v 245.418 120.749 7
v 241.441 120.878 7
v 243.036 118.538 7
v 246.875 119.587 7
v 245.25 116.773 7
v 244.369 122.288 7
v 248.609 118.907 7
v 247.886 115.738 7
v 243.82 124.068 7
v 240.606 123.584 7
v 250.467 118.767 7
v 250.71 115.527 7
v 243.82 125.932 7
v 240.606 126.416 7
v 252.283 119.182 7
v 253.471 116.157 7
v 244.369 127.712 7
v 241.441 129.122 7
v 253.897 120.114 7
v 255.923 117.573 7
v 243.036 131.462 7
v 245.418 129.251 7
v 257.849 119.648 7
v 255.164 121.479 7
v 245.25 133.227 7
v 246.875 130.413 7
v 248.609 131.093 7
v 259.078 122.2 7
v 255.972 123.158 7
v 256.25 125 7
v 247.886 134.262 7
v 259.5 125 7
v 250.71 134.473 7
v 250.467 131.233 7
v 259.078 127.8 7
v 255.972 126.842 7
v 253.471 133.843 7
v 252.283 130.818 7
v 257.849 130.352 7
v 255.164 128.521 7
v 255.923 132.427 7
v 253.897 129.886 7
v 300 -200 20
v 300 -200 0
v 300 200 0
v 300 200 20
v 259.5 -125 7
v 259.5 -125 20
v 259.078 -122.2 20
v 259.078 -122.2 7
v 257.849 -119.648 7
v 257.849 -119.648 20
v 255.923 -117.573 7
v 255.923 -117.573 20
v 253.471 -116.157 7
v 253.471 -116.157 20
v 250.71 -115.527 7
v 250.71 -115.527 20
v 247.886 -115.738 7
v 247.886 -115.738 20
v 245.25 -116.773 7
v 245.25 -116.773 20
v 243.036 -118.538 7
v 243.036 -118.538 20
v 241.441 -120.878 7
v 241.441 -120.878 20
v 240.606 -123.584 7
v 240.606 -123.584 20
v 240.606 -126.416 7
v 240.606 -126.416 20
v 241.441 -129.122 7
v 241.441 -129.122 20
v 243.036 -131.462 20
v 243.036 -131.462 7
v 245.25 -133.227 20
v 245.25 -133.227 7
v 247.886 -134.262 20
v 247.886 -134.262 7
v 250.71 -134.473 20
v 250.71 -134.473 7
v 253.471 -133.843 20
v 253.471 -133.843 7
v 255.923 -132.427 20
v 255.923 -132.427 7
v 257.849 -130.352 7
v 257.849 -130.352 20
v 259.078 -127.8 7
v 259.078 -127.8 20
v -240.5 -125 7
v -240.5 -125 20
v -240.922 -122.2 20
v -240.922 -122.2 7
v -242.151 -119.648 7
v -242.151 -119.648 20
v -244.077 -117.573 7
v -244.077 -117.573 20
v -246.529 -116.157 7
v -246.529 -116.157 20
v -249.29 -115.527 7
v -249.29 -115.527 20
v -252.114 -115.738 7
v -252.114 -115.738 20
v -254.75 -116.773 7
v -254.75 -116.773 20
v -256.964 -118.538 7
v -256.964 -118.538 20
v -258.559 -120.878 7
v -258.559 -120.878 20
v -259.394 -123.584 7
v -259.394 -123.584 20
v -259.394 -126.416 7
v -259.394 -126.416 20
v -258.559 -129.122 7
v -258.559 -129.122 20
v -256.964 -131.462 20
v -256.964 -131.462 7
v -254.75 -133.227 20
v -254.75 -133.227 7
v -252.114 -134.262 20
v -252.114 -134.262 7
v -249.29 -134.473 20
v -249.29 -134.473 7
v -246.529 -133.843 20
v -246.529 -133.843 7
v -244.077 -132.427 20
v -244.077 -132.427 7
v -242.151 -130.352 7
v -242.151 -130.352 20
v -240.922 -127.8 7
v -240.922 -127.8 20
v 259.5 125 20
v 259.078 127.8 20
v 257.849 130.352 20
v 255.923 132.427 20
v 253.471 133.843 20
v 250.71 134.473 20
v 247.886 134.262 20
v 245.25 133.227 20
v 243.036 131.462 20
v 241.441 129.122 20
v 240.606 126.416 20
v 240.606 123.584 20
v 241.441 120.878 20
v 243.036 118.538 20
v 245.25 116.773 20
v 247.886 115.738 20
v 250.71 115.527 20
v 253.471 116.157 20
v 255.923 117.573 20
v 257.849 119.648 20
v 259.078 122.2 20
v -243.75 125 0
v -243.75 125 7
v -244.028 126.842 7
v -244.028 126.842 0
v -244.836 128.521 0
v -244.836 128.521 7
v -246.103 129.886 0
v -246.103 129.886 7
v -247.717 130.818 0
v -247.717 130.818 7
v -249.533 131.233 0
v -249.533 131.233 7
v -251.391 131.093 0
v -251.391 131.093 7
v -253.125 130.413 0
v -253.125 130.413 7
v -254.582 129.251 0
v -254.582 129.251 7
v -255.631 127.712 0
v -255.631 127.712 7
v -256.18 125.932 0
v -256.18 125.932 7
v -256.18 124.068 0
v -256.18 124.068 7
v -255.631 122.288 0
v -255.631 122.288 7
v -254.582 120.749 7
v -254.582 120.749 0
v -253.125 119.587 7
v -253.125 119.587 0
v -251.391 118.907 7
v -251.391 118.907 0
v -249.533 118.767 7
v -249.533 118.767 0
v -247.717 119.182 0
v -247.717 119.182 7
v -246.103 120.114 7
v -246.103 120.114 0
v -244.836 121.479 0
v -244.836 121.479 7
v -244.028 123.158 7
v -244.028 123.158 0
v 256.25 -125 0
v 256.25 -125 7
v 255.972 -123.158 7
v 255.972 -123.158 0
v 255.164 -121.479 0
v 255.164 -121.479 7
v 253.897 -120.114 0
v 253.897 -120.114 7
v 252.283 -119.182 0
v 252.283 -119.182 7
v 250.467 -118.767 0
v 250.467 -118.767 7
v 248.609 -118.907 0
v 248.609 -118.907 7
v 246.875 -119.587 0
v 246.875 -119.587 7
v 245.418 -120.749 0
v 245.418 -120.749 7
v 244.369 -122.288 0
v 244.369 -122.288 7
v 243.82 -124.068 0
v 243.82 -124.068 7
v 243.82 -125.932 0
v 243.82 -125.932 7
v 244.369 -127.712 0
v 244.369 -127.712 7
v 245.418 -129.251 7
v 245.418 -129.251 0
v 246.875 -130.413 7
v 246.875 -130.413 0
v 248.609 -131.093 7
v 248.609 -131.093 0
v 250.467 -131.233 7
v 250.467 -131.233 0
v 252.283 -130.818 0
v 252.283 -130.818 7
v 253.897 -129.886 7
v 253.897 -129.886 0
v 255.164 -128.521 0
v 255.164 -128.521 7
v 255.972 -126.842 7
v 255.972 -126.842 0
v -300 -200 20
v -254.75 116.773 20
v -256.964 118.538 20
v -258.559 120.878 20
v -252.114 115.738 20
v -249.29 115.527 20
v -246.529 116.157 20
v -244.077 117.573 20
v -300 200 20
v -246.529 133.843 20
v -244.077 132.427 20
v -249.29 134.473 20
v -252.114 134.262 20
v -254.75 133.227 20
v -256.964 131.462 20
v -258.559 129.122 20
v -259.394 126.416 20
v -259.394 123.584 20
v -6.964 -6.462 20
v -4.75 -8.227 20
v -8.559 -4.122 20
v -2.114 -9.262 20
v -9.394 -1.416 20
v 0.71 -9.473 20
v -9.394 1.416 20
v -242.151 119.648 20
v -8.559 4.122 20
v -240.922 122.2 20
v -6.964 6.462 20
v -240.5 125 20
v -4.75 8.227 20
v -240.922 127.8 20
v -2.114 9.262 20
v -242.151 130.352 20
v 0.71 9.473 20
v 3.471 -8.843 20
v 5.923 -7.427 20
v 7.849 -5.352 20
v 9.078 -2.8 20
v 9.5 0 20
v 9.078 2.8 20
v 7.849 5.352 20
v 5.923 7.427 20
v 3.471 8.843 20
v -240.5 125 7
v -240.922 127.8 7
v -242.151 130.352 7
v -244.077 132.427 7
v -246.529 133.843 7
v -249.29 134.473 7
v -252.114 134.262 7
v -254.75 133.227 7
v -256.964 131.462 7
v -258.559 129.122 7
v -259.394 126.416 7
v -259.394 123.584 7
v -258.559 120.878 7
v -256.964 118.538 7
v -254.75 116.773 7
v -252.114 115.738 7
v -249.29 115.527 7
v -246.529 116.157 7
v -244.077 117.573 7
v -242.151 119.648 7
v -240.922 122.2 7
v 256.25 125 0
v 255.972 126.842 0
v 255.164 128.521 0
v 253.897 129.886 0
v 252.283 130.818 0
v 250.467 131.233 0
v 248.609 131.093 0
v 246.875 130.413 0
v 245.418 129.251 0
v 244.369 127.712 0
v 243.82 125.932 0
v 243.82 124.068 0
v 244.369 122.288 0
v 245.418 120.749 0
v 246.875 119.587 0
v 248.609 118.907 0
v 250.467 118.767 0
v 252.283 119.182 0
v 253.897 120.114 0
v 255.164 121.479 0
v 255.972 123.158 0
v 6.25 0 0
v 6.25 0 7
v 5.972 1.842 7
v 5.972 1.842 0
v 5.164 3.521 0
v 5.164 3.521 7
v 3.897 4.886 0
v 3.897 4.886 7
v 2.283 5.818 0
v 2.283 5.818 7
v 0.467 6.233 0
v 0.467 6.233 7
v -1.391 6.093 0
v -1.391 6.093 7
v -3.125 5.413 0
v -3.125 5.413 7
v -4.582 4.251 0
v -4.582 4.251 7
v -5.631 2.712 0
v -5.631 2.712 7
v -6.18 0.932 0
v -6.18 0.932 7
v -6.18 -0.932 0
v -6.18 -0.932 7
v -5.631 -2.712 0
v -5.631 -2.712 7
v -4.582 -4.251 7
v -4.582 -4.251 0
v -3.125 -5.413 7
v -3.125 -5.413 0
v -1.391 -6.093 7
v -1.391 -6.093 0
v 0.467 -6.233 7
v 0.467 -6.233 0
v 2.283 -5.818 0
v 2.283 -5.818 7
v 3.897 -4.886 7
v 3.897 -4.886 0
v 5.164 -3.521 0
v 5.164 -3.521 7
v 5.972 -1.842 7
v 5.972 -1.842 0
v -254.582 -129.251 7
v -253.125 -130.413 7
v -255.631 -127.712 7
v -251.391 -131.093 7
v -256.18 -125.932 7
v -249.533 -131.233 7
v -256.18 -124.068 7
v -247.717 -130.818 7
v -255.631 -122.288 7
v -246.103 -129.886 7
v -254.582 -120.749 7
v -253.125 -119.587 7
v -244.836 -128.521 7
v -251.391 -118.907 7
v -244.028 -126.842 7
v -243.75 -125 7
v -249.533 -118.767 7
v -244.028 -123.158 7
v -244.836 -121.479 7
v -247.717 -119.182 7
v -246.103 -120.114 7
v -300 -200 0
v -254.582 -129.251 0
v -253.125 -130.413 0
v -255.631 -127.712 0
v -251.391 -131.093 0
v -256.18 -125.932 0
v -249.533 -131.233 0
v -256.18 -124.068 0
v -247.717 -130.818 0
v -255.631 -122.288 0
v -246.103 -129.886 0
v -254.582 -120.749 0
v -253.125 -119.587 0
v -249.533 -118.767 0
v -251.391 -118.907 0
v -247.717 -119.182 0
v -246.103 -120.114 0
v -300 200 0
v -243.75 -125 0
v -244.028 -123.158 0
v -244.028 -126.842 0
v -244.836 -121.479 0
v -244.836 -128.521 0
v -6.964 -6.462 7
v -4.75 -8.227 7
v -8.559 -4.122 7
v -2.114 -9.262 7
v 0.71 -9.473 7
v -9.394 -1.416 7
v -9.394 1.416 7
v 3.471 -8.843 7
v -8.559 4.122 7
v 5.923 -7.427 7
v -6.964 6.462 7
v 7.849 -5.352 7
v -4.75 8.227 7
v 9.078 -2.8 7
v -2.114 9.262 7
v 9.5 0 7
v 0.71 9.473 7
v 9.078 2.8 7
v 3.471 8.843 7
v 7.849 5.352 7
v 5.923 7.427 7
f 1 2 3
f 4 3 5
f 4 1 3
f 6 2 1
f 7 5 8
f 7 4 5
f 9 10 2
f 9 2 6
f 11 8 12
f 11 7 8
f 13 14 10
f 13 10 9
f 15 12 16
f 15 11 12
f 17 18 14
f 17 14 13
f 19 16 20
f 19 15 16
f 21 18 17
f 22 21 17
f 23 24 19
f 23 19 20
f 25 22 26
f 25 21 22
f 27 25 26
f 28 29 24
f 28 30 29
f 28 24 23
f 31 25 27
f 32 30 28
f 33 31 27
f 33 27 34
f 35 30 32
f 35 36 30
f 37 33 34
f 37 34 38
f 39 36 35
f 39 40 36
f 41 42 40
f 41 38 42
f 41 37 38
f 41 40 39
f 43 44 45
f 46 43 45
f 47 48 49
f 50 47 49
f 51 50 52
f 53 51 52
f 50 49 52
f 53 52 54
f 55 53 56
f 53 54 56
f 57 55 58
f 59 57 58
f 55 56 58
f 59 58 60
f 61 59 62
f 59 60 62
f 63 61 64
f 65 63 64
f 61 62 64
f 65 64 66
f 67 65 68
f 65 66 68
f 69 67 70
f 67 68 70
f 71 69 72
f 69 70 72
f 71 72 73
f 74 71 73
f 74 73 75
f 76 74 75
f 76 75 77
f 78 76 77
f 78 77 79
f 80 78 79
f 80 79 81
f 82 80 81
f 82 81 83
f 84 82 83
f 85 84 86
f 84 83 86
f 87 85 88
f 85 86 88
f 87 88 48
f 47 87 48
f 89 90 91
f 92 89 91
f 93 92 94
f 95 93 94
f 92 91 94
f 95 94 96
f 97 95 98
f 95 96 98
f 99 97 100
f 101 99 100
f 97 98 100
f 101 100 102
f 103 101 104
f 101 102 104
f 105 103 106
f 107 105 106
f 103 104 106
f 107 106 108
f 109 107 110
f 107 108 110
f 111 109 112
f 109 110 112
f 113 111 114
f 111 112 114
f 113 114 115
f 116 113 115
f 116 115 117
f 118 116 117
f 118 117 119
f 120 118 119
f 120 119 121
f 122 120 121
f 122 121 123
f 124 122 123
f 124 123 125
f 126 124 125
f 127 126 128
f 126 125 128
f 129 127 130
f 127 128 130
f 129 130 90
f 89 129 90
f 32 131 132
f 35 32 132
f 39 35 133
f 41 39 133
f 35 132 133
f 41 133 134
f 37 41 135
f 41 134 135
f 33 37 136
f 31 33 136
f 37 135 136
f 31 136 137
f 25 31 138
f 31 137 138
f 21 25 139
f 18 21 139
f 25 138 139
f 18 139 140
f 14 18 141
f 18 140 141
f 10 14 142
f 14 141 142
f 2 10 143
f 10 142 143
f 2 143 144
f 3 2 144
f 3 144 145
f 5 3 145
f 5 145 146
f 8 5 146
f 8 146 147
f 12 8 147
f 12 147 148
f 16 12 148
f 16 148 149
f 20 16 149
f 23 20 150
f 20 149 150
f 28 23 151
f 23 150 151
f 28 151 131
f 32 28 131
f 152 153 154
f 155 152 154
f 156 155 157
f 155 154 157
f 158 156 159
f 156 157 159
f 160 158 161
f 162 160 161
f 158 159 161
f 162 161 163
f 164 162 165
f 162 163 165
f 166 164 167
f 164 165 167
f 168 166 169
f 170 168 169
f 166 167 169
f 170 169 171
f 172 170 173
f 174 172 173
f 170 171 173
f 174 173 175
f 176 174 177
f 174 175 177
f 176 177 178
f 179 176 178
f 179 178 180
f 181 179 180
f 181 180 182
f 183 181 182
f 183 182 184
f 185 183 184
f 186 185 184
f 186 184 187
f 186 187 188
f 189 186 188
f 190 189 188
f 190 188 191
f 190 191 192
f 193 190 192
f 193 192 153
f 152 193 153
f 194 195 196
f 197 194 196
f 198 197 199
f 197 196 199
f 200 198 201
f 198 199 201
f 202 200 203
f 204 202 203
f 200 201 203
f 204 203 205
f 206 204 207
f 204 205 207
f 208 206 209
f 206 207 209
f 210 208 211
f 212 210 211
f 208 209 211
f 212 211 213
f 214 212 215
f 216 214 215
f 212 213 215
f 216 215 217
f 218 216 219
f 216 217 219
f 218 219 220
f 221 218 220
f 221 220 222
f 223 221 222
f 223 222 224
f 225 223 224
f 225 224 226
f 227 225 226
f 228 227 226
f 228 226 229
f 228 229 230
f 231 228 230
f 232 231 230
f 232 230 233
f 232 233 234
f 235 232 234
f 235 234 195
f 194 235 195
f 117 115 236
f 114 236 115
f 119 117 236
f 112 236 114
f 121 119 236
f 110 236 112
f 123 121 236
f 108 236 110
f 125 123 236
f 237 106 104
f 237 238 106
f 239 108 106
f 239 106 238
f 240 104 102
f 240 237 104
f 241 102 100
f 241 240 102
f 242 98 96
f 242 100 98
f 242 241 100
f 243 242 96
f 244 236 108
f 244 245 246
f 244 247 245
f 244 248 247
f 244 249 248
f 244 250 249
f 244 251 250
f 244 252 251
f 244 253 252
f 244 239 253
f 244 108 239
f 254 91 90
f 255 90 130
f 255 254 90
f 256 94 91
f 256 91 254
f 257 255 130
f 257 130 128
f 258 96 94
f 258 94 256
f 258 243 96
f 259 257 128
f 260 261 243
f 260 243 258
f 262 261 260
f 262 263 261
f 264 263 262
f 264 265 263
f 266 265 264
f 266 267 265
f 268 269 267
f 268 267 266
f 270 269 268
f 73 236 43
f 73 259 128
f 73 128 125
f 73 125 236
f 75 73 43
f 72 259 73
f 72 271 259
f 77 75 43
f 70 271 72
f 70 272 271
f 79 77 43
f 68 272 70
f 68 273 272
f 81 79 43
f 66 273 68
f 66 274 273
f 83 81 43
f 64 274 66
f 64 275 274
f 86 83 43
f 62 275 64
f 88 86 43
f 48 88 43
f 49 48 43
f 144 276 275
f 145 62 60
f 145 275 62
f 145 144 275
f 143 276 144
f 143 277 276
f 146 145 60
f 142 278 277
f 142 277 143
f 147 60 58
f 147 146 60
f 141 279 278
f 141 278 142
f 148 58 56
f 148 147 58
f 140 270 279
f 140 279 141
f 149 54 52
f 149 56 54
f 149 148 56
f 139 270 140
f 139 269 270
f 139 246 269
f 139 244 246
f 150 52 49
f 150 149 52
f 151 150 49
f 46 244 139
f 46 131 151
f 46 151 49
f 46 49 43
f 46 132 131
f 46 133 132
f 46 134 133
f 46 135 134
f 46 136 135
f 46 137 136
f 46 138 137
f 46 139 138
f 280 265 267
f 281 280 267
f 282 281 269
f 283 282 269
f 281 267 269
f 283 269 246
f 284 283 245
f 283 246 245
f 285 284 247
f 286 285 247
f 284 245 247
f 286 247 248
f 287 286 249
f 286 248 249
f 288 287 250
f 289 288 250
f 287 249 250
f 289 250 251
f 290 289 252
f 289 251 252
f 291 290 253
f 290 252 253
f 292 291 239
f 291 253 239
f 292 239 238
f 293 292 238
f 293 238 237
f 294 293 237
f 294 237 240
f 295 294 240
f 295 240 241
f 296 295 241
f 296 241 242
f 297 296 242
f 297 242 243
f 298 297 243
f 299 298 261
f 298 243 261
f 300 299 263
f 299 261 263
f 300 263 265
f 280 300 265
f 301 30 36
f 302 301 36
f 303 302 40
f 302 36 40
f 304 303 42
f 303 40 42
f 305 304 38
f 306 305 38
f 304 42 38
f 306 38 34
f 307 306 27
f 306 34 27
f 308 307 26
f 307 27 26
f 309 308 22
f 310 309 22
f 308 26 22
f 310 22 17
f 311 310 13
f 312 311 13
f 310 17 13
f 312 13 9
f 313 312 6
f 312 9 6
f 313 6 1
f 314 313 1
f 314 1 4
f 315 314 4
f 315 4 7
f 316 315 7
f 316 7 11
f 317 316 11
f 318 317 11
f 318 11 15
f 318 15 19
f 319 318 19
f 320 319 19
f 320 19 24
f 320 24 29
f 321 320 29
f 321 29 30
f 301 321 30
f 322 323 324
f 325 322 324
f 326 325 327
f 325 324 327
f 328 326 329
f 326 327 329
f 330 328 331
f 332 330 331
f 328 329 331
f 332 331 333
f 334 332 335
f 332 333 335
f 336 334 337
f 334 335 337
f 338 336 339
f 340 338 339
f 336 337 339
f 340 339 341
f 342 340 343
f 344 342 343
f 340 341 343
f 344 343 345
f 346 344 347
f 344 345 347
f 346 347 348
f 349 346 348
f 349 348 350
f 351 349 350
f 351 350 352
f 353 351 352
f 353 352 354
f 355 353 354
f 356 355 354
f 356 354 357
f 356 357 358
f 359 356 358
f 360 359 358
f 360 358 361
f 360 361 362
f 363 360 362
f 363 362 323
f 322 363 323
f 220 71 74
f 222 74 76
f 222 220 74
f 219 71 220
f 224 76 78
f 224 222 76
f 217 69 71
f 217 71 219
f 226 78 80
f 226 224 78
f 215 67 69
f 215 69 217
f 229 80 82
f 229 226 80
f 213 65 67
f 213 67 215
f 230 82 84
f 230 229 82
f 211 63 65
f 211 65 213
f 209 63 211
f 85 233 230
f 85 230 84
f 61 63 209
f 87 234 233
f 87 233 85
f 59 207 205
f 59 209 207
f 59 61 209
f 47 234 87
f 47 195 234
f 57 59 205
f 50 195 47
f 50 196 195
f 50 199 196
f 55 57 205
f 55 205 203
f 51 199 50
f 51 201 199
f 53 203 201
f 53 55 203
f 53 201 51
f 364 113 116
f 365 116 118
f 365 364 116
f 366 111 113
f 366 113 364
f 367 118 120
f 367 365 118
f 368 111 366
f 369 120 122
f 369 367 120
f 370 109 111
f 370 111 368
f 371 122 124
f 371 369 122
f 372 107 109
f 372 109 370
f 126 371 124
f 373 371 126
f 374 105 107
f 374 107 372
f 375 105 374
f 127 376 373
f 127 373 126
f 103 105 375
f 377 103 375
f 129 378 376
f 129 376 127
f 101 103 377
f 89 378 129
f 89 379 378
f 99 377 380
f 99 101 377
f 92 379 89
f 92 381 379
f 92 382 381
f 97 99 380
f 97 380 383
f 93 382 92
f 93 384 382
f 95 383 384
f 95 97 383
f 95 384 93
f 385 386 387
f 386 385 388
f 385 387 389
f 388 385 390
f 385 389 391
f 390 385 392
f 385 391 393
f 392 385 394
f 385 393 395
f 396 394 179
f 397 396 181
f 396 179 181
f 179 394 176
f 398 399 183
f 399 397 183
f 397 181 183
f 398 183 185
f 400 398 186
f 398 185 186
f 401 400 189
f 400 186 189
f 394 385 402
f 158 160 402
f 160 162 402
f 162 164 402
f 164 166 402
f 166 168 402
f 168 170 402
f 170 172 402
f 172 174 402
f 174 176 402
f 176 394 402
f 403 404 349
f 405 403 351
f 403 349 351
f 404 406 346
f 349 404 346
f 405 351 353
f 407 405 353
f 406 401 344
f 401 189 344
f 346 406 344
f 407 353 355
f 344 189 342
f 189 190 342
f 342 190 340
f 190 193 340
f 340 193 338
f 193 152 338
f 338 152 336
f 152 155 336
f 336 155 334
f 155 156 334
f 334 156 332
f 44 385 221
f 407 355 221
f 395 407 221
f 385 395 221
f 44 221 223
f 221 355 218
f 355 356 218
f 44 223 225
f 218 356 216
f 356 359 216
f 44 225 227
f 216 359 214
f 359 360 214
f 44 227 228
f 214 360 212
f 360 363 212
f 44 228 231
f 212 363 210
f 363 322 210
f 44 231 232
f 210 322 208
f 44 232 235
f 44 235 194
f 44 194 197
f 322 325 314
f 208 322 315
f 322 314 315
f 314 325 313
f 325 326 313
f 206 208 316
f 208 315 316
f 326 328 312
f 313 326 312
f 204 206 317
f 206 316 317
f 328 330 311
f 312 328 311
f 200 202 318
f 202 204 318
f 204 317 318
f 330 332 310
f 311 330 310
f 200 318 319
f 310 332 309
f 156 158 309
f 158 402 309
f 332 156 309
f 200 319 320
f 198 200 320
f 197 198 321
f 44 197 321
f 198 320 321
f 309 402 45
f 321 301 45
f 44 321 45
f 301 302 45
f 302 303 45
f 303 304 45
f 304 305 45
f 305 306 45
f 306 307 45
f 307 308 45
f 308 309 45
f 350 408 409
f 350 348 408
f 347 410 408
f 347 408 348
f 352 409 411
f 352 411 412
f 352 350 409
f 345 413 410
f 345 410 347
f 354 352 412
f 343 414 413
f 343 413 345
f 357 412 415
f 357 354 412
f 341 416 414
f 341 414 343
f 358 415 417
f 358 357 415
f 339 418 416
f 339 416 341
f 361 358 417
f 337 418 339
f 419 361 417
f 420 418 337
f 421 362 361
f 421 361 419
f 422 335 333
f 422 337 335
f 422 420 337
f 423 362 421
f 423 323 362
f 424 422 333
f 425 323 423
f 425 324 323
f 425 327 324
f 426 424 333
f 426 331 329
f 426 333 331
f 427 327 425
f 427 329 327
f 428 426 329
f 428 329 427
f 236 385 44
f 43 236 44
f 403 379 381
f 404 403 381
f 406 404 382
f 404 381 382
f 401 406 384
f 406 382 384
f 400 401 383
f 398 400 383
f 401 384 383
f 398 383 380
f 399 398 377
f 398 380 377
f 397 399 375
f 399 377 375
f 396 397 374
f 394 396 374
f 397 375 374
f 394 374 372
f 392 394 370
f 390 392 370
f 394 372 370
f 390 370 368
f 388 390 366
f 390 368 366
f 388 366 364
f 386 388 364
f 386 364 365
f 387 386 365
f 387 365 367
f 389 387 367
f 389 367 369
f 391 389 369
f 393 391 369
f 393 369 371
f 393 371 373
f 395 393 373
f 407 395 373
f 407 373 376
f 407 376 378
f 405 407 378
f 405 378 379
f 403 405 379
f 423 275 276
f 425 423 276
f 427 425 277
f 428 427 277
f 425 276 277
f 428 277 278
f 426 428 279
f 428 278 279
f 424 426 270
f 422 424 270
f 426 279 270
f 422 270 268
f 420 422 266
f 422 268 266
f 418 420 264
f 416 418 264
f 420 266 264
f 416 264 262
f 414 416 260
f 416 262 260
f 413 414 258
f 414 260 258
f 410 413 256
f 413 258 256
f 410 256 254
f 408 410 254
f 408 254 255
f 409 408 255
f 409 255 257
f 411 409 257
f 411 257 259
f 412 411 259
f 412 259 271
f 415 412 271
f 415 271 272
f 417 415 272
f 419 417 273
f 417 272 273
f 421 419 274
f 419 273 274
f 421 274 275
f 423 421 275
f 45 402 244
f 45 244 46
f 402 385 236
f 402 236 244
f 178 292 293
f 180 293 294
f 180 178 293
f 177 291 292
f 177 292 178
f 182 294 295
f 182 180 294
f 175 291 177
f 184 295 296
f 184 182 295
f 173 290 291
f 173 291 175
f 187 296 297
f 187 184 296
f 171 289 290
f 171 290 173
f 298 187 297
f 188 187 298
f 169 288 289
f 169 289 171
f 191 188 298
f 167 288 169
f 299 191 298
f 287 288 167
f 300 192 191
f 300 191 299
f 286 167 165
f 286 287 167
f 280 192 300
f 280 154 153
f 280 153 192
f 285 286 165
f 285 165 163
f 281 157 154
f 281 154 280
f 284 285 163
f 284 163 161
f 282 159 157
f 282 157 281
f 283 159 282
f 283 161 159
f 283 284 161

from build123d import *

# Parameters (mm, degrees)
F0_W     = 600
F0_H     = 400
F1_DEPTH = 20
F2_R     = 6.25
F3_DEPTH = 25
F4_R     = 9.5
F5_DEPTH = 13


with BuildPart() as f1:
    # F0 (on Top) → F1 (new body)
    with BuildSketch(Plane.XY):
        Rectangle(F0_W, F0_H)
    extrude(amount=F1_DEPTH)

    # F2 (on face) → F3 (cut)
    with BuildSketch(Plane.XY.offset(20)):
        with Locations((-250, 125)):
            Circle(F2_R)
        with Locations((-250, -125)):
            Circle(F2_R)
        with Locations((250, 125)):
            Circle(F2_R)
        with Locations((250, -125)):
            Circle(F2_R)
        Circle(F2_R)
    extrude(amount=-F3_DEPTH, mode=Mode.SUBTRACT)

    # F4 (on face) → F5 (cut)
    with BuildSketch(Plane.XY.offset(20)):
        with Locations((250, 125)):
            Circle(F4_R)
        with Locations((250, -125)):
            Circle(F4_R)
        Circle(F4_R)
        with Locations((-250, 125)):
            Circle(F4_R)
        with Locations((-250, -125)):
            Circle(F4_R)
    extrude(amount=-F5_DEPTH, mode=Mode.SUBTRACT)


solid = f1.part
